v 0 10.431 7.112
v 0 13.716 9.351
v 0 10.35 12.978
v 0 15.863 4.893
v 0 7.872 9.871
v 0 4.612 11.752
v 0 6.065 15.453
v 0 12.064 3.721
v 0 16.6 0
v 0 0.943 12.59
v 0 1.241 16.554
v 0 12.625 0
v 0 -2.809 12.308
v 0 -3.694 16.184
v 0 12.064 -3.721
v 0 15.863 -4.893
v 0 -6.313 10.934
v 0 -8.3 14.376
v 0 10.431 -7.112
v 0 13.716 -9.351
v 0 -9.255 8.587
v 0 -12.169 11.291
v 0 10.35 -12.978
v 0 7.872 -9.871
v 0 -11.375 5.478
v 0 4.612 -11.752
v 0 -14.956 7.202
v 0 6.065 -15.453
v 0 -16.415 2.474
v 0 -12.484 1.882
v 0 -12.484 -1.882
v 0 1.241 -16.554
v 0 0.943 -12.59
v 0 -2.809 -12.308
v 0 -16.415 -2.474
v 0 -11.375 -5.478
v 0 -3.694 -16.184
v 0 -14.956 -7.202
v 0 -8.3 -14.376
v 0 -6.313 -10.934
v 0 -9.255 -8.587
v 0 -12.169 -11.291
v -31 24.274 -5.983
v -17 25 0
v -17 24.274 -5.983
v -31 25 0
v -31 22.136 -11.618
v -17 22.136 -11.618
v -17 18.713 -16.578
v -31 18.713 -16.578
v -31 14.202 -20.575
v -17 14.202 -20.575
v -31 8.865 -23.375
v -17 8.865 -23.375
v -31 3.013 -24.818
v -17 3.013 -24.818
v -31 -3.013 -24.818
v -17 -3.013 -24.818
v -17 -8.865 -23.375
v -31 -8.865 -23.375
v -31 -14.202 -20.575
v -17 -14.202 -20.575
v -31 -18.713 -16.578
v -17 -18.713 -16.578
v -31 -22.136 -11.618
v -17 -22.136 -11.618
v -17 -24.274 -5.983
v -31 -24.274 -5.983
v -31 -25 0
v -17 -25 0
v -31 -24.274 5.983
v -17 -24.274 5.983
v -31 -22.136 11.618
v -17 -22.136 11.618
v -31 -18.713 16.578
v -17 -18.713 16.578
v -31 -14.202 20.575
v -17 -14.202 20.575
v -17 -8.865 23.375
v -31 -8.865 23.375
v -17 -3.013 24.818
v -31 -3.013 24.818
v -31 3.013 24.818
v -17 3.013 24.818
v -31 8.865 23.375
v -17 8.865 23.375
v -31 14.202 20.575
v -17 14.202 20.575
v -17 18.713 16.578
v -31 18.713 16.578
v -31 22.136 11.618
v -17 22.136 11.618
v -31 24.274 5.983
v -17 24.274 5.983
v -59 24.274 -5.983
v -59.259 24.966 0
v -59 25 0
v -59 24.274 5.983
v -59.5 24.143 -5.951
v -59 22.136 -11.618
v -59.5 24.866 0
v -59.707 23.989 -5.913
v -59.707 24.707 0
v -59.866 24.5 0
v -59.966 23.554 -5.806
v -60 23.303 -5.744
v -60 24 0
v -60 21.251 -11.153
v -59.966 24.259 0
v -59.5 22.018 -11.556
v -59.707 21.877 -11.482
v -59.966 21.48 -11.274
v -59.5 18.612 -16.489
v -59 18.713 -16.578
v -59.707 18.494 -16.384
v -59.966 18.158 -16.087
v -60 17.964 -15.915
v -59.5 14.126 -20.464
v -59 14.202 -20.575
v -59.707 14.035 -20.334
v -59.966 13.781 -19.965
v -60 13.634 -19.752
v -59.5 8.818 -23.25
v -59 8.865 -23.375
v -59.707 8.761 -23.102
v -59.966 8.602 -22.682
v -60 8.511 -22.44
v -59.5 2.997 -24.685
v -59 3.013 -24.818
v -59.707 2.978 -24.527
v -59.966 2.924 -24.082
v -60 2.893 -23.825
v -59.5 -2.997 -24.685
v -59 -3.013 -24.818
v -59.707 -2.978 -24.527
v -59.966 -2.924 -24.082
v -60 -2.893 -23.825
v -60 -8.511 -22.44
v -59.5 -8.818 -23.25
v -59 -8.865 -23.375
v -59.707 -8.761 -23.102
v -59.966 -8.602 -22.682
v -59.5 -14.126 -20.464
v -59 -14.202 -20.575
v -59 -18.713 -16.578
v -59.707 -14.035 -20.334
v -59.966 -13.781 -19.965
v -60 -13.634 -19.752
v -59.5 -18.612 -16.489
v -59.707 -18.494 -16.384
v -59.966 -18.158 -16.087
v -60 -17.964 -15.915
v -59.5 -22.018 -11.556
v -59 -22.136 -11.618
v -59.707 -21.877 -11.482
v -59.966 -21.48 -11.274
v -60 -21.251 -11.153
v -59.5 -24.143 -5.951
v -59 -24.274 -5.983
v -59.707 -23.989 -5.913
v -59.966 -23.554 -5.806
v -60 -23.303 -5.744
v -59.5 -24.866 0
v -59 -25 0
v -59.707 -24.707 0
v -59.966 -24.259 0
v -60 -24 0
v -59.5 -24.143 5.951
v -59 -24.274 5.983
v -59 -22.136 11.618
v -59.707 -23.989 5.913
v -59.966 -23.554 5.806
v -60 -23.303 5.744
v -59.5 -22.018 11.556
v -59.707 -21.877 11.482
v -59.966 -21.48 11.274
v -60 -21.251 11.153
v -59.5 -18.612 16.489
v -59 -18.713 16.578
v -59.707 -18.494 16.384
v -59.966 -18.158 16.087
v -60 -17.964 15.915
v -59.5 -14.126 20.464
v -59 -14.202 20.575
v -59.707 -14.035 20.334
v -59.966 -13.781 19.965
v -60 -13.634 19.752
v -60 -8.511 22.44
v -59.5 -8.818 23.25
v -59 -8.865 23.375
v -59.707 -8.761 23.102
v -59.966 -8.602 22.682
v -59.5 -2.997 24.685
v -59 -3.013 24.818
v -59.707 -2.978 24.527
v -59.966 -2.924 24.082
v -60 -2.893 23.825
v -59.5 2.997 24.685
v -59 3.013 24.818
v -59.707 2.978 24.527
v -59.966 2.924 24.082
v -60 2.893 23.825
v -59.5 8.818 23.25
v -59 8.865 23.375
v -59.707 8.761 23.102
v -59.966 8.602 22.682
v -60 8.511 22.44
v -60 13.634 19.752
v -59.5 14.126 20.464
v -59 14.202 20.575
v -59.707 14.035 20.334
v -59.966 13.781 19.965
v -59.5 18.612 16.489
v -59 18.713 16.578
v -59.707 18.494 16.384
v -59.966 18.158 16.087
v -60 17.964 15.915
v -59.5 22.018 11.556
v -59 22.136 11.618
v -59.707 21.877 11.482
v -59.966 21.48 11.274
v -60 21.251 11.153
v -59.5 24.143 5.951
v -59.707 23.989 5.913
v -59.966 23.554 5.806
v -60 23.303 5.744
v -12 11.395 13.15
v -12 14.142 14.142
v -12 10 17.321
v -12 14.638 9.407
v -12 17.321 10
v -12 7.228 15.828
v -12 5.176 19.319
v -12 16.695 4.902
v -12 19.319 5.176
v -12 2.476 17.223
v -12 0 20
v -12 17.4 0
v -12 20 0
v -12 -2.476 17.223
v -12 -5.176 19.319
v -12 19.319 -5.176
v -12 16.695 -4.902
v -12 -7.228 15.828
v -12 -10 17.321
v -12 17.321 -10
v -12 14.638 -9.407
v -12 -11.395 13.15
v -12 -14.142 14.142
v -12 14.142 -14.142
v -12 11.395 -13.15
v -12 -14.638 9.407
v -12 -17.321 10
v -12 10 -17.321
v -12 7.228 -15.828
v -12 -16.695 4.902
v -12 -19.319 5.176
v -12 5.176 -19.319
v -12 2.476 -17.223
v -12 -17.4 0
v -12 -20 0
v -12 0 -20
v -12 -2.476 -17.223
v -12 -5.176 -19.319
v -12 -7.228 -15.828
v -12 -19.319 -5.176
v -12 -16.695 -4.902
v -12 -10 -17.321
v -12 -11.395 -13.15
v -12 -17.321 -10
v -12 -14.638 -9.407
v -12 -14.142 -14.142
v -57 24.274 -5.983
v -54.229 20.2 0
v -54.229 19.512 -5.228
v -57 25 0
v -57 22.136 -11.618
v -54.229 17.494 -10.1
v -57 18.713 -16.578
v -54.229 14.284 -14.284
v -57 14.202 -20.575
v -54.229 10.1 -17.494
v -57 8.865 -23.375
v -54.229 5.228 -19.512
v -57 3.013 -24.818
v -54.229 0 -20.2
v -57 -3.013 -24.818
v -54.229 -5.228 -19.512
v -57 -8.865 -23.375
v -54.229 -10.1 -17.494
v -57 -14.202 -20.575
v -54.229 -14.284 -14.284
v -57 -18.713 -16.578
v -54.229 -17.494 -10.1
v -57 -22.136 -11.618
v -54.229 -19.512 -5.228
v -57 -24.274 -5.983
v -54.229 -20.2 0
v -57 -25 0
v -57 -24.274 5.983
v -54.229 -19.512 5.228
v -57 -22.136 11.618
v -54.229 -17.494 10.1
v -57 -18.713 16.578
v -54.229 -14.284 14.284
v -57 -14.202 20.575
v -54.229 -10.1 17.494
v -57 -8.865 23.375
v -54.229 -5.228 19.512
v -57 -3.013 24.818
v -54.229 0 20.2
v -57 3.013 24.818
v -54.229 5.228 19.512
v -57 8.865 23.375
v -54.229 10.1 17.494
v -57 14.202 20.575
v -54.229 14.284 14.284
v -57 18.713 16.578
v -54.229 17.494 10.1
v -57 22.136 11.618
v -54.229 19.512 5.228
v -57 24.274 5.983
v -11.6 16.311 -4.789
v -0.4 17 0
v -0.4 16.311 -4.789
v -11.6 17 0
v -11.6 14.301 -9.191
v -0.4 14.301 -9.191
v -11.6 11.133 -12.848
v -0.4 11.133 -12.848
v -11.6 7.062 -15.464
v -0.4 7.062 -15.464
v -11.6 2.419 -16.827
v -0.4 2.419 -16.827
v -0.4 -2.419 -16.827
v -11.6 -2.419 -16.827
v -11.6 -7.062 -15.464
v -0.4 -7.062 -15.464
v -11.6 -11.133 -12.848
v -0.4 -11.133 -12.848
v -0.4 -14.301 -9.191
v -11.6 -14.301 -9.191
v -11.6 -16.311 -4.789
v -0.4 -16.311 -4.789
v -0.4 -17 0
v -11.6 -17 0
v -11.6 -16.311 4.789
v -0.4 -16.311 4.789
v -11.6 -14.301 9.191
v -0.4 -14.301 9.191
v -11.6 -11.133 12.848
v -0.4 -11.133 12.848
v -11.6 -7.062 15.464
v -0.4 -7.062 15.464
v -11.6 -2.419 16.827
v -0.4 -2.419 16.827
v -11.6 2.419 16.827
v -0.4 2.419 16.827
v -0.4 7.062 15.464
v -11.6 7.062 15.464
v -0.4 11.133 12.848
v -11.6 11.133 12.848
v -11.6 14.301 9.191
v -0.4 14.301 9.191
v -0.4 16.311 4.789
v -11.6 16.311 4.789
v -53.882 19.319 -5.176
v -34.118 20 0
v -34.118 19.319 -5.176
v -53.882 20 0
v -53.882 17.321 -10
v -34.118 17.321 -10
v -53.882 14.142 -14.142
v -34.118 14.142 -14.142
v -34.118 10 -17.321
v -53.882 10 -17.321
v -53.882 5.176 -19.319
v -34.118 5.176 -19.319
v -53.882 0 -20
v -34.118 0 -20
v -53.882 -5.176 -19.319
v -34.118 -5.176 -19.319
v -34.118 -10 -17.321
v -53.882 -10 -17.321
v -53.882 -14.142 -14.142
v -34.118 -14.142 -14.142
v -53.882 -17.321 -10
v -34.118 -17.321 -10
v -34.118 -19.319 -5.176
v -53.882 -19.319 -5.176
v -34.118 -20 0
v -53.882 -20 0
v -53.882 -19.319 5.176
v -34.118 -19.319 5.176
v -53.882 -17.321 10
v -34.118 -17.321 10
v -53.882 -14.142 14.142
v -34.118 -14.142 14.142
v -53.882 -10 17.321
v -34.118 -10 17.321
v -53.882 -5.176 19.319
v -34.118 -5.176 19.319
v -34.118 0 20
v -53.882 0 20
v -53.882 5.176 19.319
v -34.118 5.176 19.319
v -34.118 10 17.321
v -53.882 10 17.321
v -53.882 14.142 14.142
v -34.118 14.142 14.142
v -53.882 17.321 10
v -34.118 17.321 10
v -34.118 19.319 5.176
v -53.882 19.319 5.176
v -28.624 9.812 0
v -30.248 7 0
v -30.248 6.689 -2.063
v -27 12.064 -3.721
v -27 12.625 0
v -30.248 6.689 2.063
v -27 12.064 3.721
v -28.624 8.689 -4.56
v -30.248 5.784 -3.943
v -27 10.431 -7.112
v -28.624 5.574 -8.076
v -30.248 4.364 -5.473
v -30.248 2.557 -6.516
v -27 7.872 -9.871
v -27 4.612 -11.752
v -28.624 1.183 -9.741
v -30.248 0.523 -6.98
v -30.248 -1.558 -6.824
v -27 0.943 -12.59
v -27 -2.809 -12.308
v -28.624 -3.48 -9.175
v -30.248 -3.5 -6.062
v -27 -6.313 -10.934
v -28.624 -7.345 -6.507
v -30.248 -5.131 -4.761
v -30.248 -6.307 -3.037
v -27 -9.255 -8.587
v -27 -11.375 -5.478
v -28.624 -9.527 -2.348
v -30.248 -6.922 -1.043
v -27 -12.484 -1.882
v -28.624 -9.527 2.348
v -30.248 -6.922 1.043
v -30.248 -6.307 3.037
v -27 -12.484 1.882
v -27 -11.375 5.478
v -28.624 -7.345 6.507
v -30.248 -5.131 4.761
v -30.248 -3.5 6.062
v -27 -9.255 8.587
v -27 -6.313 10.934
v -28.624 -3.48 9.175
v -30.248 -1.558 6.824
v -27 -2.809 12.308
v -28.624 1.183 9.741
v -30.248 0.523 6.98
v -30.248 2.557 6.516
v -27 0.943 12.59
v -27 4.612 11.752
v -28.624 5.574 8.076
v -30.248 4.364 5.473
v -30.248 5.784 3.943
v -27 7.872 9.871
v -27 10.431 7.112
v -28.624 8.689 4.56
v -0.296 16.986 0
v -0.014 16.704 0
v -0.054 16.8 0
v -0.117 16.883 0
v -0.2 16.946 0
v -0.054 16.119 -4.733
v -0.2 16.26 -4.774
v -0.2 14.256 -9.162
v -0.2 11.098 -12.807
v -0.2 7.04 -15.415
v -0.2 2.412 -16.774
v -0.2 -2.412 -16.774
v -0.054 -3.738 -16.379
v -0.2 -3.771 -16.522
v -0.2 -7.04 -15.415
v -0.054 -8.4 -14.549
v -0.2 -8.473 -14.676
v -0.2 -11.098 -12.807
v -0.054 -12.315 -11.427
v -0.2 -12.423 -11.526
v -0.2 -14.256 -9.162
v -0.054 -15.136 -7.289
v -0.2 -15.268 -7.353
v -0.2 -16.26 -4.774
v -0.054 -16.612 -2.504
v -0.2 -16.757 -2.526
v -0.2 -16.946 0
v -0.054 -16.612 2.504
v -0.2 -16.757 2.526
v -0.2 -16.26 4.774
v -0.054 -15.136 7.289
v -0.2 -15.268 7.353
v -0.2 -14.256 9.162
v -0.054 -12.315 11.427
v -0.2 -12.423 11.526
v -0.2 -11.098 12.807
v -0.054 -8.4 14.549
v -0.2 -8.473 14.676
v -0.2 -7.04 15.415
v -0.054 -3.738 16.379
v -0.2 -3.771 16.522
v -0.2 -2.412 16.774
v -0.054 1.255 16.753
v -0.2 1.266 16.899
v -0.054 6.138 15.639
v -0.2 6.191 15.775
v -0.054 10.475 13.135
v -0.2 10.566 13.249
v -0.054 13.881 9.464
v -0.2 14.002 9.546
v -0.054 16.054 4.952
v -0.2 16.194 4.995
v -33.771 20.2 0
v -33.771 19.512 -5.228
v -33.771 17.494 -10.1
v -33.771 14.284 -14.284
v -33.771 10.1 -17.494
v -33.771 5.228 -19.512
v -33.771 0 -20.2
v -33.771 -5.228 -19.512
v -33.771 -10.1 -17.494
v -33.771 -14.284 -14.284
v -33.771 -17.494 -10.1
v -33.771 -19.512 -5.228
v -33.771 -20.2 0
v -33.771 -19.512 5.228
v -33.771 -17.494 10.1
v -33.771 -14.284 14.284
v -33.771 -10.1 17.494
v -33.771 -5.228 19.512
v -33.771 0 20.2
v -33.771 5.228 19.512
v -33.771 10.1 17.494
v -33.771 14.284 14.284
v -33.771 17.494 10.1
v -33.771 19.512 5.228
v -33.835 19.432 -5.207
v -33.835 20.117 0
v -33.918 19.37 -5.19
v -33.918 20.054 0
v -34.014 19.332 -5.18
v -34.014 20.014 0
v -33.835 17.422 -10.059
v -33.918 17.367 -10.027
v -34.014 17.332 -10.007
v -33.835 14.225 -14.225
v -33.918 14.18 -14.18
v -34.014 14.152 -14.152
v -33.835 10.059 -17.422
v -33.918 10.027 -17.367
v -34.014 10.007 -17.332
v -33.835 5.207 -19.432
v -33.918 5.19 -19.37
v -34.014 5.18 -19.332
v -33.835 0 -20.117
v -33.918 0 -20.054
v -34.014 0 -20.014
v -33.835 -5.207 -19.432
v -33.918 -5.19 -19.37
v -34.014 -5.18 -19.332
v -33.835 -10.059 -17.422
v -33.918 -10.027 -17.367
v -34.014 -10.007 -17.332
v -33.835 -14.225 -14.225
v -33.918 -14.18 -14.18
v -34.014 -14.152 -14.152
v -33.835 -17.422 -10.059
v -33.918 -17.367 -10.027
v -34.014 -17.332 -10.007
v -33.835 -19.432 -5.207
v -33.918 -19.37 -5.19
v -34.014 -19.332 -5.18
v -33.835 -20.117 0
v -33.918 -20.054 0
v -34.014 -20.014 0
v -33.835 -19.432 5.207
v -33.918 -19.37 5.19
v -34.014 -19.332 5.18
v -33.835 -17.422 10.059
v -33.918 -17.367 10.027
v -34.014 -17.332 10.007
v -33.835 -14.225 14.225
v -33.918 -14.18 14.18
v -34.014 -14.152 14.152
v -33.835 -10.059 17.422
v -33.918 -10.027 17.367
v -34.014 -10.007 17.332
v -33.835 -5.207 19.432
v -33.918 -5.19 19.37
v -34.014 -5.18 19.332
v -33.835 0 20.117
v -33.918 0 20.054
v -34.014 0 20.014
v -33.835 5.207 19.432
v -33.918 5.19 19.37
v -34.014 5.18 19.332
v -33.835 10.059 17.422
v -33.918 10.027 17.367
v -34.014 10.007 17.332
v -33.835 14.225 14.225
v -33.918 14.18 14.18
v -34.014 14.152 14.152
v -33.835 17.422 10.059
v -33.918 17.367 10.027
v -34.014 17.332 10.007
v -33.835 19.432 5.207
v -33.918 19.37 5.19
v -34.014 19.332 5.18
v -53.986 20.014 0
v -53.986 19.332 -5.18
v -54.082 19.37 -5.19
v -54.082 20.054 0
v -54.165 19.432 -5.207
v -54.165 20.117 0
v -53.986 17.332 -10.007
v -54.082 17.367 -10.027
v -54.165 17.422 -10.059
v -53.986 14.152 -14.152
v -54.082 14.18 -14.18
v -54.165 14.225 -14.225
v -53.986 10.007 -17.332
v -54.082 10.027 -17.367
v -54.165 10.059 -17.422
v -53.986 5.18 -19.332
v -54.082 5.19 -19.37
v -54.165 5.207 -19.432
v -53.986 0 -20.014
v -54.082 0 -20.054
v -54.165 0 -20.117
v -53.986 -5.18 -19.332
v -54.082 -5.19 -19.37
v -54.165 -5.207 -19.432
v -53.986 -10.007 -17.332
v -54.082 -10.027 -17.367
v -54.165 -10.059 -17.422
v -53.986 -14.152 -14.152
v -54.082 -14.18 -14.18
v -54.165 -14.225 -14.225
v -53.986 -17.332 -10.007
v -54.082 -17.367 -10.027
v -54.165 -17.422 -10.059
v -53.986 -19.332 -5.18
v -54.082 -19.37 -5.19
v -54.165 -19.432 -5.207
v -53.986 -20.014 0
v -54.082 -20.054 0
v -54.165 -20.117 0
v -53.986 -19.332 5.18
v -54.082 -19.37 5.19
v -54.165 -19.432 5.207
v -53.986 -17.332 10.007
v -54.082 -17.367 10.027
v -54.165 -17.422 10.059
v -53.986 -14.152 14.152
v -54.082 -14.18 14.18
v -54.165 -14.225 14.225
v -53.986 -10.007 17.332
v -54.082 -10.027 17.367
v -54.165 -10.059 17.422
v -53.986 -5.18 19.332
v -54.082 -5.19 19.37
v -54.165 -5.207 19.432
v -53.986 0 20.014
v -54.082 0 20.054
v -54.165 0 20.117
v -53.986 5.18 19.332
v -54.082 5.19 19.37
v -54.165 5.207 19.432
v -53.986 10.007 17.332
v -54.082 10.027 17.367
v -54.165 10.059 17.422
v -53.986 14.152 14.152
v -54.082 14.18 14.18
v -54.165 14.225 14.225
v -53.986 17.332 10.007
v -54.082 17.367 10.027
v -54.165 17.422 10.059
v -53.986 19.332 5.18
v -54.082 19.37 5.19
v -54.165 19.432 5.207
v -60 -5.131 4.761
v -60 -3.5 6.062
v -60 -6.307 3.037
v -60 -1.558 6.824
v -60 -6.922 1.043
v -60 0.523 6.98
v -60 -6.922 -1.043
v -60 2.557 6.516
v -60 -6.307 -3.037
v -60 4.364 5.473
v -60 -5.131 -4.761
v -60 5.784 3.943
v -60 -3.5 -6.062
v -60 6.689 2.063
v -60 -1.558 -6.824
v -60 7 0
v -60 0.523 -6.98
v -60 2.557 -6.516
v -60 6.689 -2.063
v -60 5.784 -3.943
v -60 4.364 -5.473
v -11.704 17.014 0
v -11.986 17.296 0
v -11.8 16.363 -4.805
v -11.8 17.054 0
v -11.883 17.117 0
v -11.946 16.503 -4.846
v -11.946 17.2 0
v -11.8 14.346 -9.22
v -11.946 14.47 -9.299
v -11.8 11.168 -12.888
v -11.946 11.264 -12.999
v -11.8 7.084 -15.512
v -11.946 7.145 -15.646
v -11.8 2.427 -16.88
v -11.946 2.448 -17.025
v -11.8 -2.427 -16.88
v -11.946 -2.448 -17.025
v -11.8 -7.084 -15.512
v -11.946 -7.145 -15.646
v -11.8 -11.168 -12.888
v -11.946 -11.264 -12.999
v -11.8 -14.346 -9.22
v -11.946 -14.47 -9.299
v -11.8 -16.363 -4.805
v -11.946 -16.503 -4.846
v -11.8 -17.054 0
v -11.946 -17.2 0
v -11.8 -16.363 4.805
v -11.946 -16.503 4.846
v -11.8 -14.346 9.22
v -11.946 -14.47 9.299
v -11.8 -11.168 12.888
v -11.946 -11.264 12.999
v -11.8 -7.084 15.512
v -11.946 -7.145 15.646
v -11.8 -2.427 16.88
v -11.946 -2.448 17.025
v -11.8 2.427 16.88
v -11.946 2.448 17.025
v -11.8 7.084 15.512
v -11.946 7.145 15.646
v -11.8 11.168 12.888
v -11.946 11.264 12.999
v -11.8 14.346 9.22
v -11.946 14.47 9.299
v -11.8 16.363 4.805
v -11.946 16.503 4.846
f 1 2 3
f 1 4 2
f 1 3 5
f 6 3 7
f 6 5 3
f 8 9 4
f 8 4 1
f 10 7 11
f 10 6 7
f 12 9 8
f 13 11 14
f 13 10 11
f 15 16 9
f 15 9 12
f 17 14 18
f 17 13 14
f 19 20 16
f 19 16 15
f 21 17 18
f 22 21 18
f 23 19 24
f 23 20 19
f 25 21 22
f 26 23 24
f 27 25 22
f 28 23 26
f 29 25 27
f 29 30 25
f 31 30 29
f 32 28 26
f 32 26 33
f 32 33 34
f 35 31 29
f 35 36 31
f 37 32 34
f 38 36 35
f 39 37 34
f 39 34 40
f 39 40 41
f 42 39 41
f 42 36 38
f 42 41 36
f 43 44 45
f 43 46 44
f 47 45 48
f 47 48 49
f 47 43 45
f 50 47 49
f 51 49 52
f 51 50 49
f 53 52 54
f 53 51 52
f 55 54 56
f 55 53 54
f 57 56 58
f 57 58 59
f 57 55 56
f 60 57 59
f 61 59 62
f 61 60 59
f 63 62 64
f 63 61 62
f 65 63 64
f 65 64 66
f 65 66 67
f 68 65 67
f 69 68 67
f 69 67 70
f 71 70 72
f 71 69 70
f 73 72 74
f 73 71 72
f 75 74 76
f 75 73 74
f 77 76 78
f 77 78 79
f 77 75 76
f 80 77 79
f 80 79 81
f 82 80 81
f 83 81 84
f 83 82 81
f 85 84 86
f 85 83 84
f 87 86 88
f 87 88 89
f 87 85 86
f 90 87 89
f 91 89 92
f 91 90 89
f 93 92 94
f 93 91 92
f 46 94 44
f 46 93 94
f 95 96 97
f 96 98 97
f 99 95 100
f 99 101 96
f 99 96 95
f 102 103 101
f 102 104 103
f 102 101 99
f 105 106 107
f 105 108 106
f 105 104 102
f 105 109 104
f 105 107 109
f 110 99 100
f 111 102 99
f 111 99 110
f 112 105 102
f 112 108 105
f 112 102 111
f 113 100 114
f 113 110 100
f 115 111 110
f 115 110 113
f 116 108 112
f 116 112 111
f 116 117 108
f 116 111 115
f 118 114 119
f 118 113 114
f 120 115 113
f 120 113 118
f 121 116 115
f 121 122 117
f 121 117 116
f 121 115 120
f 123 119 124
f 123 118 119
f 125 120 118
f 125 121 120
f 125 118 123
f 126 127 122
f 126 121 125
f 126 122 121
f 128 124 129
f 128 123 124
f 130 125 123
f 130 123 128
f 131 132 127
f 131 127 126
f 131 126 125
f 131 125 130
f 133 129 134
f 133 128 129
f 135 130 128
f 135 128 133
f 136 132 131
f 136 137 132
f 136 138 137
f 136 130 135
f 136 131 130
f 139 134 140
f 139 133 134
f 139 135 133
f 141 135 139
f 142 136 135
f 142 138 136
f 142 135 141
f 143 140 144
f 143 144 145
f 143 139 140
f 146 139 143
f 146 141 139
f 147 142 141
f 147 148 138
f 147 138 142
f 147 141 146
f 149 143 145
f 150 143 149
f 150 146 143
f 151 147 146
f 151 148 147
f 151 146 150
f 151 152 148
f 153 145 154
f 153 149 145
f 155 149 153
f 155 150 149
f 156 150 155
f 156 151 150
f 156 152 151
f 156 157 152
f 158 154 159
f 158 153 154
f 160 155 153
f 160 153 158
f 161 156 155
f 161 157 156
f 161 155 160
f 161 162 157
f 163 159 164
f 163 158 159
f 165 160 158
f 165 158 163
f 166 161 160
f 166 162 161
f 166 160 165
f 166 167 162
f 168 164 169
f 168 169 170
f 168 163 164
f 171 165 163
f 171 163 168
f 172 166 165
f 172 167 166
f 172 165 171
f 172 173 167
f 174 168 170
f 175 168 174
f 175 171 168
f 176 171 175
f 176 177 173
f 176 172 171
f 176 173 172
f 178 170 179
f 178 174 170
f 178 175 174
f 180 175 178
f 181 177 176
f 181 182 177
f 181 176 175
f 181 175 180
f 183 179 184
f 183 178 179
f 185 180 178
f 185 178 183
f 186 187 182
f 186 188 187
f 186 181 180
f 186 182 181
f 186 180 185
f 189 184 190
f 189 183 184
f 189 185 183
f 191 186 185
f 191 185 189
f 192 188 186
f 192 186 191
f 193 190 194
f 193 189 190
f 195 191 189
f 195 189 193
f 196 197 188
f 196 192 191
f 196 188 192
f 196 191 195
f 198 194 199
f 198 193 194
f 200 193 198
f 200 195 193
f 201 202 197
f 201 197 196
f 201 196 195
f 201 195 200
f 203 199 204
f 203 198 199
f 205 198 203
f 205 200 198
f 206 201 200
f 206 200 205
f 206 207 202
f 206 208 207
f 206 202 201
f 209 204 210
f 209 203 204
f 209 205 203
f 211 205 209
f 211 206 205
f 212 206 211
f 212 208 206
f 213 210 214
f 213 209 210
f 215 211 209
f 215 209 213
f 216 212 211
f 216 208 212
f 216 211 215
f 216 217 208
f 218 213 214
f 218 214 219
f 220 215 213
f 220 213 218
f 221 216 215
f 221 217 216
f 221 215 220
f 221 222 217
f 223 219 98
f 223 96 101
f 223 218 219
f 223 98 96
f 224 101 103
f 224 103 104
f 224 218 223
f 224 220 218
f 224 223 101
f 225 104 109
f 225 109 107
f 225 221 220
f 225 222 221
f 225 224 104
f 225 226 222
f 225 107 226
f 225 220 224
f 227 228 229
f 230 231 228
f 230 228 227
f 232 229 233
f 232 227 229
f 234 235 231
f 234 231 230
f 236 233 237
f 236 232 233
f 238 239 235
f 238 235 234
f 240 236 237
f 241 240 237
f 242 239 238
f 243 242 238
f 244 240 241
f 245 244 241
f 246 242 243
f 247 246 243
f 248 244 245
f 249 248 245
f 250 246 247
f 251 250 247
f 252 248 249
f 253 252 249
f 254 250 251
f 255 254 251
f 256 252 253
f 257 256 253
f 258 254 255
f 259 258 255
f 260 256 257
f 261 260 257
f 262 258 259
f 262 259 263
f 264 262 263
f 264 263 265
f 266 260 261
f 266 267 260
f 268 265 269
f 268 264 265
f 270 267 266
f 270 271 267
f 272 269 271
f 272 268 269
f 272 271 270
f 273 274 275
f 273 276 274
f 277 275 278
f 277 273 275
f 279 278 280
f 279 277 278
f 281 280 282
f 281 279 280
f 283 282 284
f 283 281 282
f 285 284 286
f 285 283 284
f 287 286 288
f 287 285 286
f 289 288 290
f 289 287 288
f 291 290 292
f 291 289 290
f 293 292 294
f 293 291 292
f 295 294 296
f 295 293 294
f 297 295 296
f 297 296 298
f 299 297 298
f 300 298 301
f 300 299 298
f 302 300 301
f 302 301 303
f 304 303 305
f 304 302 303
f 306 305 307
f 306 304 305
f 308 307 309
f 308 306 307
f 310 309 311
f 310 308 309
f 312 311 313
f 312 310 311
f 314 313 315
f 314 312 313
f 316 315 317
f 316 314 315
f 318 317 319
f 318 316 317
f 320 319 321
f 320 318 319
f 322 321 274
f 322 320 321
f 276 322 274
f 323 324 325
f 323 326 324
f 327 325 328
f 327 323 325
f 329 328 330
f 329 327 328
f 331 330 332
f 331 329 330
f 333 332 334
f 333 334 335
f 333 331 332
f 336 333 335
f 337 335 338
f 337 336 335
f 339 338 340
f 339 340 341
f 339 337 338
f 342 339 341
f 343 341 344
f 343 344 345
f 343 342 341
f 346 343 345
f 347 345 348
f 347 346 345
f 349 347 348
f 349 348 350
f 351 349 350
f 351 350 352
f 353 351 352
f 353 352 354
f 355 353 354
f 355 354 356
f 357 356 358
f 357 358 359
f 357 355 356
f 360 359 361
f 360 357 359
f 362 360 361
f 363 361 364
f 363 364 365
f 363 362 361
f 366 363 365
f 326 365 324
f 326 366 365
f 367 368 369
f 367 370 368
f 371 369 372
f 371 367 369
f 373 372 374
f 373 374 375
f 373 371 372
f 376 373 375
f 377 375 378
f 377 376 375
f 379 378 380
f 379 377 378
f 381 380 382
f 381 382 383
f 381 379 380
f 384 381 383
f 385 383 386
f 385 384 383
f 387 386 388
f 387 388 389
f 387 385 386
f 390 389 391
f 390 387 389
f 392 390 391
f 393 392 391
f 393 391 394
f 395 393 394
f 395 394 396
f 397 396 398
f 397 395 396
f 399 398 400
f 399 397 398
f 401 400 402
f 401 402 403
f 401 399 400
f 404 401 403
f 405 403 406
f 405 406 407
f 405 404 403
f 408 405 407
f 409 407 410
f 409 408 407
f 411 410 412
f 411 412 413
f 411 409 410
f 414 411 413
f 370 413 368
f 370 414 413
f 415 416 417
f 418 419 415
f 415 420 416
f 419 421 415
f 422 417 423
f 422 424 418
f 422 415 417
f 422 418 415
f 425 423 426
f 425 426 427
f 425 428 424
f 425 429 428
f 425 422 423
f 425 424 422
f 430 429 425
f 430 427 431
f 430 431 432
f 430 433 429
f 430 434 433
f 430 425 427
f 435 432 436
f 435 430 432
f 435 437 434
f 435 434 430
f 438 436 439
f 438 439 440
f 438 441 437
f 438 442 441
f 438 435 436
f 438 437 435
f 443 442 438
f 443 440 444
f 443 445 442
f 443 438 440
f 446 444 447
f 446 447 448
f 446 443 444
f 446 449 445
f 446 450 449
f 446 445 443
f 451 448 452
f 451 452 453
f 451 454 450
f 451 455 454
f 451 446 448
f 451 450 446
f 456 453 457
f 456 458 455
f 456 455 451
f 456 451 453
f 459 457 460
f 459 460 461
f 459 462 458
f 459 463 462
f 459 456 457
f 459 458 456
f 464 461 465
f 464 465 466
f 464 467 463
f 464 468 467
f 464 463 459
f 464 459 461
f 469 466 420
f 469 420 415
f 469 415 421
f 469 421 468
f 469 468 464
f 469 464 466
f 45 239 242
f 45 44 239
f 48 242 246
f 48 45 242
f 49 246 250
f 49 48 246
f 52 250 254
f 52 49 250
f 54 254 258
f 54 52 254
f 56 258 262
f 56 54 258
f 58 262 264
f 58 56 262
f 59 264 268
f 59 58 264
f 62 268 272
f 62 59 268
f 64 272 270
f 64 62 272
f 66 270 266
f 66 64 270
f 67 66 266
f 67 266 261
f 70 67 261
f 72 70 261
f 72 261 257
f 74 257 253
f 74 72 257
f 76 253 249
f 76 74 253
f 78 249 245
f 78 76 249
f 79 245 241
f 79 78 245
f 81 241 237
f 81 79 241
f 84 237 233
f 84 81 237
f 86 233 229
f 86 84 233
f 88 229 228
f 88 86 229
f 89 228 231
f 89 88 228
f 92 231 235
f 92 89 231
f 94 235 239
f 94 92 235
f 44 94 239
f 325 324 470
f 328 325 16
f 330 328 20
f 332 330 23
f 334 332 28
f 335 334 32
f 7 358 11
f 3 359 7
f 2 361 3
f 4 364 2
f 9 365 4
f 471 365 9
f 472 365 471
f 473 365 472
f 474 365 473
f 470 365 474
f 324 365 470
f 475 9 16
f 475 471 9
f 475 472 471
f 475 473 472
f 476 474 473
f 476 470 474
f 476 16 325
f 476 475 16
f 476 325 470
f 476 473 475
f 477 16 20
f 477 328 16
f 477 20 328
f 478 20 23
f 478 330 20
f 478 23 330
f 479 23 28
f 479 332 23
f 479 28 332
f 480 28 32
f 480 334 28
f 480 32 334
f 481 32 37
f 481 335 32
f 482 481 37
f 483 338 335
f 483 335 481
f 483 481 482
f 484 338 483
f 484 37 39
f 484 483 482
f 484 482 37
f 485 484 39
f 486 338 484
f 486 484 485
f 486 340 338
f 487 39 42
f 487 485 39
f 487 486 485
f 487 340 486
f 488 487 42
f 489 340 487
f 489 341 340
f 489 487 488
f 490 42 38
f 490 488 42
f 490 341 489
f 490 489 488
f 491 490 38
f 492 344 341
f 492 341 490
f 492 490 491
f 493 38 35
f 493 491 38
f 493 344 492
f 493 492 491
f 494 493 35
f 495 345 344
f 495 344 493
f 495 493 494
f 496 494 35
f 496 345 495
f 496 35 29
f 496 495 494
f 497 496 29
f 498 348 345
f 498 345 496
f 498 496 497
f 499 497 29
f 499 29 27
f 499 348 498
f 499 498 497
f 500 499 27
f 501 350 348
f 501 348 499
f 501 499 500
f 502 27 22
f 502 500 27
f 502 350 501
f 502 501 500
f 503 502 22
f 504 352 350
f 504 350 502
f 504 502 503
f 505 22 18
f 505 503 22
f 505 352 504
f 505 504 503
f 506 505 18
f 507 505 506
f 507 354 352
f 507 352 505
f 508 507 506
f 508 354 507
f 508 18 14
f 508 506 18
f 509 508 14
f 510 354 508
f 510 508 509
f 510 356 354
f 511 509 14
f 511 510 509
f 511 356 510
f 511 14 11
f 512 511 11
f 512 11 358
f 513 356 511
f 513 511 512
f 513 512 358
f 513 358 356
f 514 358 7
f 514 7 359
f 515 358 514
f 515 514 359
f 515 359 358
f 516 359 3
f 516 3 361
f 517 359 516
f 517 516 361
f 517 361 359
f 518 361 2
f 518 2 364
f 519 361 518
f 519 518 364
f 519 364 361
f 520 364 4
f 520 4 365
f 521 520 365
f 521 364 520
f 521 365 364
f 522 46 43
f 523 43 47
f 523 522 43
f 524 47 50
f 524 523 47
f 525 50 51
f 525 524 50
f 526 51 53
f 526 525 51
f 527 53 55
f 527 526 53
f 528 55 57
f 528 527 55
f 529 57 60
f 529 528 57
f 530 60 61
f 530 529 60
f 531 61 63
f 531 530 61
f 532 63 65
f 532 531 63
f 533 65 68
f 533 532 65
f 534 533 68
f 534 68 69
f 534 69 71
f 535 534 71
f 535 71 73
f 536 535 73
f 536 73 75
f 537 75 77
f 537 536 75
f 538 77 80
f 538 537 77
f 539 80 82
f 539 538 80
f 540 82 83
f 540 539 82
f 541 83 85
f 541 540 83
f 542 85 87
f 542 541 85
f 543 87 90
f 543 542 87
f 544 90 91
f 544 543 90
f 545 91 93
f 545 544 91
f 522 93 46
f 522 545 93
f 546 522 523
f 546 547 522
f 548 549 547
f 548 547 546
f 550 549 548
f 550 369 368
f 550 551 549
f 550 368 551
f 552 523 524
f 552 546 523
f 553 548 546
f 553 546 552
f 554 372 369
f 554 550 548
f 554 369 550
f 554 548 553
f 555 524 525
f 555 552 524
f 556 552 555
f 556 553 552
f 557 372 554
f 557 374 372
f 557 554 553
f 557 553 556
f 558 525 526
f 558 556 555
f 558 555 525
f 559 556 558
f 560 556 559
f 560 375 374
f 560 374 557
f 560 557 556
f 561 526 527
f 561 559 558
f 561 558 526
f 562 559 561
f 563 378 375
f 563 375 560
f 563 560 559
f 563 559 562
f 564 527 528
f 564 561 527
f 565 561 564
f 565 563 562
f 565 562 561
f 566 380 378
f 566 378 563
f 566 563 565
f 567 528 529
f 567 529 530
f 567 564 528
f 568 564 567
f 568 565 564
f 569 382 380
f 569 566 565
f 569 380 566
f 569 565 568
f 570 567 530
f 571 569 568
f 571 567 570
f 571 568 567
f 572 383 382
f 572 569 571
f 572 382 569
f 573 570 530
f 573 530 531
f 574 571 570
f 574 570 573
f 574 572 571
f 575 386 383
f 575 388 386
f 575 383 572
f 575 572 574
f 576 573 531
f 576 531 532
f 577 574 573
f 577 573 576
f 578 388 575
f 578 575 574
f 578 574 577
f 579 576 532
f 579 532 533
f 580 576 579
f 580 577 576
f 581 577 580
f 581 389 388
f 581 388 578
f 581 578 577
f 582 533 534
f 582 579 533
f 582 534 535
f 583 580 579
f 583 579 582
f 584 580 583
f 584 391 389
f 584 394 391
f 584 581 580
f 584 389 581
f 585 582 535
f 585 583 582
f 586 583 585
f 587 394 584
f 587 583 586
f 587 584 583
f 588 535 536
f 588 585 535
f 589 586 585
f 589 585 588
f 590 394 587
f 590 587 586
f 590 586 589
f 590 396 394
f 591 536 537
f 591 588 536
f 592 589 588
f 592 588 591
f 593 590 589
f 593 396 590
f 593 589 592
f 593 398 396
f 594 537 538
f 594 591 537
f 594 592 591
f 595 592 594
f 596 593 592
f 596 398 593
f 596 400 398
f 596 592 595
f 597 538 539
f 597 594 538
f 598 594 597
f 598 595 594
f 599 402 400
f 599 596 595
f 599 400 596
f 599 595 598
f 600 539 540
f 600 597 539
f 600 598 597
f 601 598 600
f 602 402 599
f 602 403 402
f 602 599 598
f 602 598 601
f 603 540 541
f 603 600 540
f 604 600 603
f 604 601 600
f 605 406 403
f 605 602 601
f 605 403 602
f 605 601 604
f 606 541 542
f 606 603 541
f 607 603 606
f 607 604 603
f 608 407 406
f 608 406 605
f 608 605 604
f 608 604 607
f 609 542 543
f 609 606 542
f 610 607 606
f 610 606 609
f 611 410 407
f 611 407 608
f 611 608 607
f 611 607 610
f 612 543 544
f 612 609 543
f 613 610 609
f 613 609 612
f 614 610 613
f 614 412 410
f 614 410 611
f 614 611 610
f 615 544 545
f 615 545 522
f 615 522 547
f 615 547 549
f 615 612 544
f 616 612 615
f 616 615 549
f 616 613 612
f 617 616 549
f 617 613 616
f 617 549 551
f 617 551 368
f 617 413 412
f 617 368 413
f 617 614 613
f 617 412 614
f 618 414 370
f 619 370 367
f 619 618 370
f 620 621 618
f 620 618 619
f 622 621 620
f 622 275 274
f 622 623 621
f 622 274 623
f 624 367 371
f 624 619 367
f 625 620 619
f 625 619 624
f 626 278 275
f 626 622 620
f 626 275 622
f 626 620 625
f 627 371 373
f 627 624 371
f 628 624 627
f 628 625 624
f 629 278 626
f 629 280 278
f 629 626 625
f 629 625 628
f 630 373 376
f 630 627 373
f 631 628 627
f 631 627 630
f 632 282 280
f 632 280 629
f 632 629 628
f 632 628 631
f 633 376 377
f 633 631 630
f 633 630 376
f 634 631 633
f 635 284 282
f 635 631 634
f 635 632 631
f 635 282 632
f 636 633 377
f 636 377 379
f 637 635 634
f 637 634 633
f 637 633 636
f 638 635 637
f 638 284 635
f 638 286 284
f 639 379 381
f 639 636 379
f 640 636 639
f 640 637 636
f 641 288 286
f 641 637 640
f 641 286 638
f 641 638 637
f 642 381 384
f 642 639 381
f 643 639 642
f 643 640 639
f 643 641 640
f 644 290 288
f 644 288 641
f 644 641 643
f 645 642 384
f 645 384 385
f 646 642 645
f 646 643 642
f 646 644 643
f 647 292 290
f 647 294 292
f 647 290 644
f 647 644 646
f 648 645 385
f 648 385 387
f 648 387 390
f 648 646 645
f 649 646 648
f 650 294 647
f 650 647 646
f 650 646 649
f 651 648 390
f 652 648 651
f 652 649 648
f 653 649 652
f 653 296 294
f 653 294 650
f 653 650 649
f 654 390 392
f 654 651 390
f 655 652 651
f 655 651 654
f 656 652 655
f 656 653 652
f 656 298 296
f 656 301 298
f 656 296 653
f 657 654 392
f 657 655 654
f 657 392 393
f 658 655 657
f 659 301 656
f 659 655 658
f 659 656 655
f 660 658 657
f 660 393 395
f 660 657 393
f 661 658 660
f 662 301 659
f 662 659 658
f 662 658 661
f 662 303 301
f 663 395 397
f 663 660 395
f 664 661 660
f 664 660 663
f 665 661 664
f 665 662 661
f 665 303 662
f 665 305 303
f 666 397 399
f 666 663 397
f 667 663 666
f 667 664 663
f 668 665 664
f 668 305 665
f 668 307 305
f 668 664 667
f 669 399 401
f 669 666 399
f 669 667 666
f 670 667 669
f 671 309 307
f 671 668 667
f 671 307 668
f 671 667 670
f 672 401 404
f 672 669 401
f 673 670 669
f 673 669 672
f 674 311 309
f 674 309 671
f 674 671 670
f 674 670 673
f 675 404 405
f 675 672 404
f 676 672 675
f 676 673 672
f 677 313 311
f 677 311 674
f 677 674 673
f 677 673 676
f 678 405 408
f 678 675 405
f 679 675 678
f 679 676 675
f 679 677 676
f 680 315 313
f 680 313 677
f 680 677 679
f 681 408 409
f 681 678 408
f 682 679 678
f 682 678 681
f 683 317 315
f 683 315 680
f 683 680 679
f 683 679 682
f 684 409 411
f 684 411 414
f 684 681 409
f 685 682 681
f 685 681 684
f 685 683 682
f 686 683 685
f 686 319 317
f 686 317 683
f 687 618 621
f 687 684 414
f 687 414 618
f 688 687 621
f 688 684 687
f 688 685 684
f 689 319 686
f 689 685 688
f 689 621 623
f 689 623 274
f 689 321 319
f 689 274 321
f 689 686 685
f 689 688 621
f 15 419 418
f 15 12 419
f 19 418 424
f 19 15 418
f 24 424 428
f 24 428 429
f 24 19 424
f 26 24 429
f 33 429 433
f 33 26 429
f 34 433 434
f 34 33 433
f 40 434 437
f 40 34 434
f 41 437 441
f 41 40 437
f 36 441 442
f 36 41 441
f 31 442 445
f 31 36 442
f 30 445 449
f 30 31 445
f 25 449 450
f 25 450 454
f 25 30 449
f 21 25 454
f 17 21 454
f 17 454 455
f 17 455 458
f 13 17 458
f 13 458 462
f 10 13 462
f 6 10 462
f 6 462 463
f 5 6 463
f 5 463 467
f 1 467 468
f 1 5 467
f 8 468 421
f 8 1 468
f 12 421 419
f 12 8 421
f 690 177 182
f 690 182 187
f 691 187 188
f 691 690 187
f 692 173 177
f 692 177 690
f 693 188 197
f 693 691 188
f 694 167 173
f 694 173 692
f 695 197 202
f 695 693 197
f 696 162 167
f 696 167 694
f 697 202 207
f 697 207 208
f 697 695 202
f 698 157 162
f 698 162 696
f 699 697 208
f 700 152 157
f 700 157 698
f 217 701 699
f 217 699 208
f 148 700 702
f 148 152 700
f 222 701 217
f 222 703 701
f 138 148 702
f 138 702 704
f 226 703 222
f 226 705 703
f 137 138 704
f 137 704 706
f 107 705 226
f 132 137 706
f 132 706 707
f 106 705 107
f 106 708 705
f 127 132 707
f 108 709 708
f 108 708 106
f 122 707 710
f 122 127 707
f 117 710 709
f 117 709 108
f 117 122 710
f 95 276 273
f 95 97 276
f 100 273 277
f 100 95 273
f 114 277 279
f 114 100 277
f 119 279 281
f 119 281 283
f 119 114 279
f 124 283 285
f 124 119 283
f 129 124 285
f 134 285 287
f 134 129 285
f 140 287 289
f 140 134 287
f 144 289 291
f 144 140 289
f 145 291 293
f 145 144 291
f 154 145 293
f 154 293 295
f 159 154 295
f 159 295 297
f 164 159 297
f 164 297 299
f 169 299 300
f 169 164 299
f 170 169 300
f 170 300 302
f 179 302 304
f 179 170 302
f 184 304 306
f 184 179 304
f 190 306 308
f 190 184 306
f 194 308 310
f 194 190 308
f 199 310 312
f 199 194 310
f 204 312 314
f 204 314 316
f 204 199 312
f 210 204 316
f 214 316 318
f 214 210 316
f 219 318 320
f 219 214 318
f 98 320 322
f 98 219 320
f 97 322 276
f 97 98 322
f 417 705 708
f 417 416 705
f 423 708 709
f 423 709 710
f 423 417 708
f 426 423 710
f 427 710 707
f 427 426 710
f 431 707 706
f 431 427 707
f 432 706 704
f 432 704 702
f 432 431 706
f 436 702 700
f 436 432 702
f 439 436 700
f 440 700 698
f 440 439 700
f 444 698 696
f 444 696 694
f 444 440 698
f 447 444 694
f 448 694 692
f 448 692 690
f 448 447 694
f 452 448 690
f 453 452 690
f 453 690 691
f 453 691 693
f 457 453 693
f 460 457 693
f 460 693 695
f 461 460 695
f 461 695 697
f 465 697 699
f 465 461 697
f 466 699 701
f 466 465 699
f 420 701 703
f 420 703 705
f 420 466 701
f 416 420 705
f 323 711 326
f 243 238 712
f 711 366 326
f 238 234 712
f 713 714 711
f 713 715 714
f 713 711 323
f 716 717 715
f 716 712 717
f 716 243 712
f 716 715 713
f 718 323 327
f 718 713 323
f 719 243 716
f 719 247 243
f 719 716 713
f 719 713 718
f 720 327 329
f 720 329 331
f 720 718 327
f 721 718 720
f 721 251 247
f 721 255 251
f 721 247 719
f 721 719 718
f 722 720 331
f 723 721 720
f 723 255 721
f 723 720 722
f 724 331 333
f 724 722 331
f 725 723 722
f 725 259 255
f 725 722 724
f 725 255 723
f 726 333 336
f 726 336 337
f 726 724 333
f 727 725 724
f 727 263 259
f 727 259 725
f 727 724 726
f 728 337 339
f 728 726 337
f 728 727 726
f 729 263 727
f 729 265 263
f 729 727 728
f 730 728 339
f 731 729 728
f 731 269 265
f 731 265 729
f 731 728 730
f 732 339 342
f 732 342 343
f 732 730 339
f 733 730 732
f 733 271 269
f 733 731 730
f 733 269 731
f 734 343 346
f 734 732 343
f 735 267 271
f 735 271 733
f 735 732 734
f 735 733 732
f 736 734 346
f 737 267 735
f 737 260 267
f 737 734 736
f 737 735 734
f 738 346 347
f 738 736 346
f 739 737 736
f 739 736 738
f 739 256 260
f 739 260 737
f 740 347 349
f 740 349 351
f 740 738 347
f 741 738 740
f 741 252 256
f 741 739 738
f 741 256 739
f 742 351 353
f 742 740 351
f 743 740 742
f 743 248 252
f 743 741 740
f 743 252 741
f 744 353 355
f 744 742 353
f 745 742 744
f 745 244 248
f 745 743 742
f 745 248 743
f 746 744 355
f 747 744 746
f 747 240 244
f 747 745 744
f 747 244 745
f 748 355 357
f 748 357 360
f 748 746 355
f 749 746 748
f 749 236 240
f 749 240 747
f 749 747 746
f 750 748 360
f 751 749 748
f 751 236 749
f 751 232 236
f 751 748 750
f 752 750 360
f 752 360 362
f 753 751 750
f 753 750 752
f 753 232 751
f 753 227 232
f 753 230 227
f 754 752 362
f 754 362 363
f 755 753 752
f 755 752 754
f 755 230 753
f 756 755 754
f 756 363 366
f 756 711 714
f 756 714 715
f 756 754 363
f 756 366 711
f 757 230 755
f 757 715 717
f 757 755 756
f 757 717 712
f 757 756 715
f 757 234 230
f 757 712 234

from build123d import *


with BuildPart() as part:
    # Sketch1 → Base-Revolve (revolve)
    with BuildSketch(Plane.XY):
        with BuildLine():
            Line((0, 12.625), (0, 16.6))
            ThreePointArc((0, 16.6), (-0.117157288, 16.882842712), (-0.4, 17))
            Line((-0.4, 17), (-11.6, 17))
            ThreePointArc((-11.6, 17), (-11.882842712, 17.117157288), (-12, 17.4))
            Line((-12, 17.4), (-12, 20))
            Line((-12, 20), (-17, 25))
            Line((-17, 25), (-31, 25))
            Line((-31, 25), (-33.771281292, 20.2))
            ThreePointArc((-33.771281292, 20.2), (-33.917691454, 20.053589838), (-34.117691454, 20))
            Line((-34.117691454, 20), (-53.882308546, 20))
            ThreePointArc((-53.882308546, 20), (-54.082308546, 20.053589838), (-54.228718708, 20.2))
            Line((-54.228718708, 20.2), (-57, 25))
            Line((-57, 25), (-59, 25))
            ThreePointArc((-59, 25), (-59.707106781, 24.707106781), (-60, 24))
            Line((-60, 24), (-60, 7))
            Line((-60, 7), (-30.247595264, 7))
            Line((-30.247595264, 7), (-27, 12.625))
            Line((-27, 12.625), (0, 12.625))
        make_face()
    revolve(axis=Axis((0, 0, 0), (-1, 0, 0)))


solid = part.part
